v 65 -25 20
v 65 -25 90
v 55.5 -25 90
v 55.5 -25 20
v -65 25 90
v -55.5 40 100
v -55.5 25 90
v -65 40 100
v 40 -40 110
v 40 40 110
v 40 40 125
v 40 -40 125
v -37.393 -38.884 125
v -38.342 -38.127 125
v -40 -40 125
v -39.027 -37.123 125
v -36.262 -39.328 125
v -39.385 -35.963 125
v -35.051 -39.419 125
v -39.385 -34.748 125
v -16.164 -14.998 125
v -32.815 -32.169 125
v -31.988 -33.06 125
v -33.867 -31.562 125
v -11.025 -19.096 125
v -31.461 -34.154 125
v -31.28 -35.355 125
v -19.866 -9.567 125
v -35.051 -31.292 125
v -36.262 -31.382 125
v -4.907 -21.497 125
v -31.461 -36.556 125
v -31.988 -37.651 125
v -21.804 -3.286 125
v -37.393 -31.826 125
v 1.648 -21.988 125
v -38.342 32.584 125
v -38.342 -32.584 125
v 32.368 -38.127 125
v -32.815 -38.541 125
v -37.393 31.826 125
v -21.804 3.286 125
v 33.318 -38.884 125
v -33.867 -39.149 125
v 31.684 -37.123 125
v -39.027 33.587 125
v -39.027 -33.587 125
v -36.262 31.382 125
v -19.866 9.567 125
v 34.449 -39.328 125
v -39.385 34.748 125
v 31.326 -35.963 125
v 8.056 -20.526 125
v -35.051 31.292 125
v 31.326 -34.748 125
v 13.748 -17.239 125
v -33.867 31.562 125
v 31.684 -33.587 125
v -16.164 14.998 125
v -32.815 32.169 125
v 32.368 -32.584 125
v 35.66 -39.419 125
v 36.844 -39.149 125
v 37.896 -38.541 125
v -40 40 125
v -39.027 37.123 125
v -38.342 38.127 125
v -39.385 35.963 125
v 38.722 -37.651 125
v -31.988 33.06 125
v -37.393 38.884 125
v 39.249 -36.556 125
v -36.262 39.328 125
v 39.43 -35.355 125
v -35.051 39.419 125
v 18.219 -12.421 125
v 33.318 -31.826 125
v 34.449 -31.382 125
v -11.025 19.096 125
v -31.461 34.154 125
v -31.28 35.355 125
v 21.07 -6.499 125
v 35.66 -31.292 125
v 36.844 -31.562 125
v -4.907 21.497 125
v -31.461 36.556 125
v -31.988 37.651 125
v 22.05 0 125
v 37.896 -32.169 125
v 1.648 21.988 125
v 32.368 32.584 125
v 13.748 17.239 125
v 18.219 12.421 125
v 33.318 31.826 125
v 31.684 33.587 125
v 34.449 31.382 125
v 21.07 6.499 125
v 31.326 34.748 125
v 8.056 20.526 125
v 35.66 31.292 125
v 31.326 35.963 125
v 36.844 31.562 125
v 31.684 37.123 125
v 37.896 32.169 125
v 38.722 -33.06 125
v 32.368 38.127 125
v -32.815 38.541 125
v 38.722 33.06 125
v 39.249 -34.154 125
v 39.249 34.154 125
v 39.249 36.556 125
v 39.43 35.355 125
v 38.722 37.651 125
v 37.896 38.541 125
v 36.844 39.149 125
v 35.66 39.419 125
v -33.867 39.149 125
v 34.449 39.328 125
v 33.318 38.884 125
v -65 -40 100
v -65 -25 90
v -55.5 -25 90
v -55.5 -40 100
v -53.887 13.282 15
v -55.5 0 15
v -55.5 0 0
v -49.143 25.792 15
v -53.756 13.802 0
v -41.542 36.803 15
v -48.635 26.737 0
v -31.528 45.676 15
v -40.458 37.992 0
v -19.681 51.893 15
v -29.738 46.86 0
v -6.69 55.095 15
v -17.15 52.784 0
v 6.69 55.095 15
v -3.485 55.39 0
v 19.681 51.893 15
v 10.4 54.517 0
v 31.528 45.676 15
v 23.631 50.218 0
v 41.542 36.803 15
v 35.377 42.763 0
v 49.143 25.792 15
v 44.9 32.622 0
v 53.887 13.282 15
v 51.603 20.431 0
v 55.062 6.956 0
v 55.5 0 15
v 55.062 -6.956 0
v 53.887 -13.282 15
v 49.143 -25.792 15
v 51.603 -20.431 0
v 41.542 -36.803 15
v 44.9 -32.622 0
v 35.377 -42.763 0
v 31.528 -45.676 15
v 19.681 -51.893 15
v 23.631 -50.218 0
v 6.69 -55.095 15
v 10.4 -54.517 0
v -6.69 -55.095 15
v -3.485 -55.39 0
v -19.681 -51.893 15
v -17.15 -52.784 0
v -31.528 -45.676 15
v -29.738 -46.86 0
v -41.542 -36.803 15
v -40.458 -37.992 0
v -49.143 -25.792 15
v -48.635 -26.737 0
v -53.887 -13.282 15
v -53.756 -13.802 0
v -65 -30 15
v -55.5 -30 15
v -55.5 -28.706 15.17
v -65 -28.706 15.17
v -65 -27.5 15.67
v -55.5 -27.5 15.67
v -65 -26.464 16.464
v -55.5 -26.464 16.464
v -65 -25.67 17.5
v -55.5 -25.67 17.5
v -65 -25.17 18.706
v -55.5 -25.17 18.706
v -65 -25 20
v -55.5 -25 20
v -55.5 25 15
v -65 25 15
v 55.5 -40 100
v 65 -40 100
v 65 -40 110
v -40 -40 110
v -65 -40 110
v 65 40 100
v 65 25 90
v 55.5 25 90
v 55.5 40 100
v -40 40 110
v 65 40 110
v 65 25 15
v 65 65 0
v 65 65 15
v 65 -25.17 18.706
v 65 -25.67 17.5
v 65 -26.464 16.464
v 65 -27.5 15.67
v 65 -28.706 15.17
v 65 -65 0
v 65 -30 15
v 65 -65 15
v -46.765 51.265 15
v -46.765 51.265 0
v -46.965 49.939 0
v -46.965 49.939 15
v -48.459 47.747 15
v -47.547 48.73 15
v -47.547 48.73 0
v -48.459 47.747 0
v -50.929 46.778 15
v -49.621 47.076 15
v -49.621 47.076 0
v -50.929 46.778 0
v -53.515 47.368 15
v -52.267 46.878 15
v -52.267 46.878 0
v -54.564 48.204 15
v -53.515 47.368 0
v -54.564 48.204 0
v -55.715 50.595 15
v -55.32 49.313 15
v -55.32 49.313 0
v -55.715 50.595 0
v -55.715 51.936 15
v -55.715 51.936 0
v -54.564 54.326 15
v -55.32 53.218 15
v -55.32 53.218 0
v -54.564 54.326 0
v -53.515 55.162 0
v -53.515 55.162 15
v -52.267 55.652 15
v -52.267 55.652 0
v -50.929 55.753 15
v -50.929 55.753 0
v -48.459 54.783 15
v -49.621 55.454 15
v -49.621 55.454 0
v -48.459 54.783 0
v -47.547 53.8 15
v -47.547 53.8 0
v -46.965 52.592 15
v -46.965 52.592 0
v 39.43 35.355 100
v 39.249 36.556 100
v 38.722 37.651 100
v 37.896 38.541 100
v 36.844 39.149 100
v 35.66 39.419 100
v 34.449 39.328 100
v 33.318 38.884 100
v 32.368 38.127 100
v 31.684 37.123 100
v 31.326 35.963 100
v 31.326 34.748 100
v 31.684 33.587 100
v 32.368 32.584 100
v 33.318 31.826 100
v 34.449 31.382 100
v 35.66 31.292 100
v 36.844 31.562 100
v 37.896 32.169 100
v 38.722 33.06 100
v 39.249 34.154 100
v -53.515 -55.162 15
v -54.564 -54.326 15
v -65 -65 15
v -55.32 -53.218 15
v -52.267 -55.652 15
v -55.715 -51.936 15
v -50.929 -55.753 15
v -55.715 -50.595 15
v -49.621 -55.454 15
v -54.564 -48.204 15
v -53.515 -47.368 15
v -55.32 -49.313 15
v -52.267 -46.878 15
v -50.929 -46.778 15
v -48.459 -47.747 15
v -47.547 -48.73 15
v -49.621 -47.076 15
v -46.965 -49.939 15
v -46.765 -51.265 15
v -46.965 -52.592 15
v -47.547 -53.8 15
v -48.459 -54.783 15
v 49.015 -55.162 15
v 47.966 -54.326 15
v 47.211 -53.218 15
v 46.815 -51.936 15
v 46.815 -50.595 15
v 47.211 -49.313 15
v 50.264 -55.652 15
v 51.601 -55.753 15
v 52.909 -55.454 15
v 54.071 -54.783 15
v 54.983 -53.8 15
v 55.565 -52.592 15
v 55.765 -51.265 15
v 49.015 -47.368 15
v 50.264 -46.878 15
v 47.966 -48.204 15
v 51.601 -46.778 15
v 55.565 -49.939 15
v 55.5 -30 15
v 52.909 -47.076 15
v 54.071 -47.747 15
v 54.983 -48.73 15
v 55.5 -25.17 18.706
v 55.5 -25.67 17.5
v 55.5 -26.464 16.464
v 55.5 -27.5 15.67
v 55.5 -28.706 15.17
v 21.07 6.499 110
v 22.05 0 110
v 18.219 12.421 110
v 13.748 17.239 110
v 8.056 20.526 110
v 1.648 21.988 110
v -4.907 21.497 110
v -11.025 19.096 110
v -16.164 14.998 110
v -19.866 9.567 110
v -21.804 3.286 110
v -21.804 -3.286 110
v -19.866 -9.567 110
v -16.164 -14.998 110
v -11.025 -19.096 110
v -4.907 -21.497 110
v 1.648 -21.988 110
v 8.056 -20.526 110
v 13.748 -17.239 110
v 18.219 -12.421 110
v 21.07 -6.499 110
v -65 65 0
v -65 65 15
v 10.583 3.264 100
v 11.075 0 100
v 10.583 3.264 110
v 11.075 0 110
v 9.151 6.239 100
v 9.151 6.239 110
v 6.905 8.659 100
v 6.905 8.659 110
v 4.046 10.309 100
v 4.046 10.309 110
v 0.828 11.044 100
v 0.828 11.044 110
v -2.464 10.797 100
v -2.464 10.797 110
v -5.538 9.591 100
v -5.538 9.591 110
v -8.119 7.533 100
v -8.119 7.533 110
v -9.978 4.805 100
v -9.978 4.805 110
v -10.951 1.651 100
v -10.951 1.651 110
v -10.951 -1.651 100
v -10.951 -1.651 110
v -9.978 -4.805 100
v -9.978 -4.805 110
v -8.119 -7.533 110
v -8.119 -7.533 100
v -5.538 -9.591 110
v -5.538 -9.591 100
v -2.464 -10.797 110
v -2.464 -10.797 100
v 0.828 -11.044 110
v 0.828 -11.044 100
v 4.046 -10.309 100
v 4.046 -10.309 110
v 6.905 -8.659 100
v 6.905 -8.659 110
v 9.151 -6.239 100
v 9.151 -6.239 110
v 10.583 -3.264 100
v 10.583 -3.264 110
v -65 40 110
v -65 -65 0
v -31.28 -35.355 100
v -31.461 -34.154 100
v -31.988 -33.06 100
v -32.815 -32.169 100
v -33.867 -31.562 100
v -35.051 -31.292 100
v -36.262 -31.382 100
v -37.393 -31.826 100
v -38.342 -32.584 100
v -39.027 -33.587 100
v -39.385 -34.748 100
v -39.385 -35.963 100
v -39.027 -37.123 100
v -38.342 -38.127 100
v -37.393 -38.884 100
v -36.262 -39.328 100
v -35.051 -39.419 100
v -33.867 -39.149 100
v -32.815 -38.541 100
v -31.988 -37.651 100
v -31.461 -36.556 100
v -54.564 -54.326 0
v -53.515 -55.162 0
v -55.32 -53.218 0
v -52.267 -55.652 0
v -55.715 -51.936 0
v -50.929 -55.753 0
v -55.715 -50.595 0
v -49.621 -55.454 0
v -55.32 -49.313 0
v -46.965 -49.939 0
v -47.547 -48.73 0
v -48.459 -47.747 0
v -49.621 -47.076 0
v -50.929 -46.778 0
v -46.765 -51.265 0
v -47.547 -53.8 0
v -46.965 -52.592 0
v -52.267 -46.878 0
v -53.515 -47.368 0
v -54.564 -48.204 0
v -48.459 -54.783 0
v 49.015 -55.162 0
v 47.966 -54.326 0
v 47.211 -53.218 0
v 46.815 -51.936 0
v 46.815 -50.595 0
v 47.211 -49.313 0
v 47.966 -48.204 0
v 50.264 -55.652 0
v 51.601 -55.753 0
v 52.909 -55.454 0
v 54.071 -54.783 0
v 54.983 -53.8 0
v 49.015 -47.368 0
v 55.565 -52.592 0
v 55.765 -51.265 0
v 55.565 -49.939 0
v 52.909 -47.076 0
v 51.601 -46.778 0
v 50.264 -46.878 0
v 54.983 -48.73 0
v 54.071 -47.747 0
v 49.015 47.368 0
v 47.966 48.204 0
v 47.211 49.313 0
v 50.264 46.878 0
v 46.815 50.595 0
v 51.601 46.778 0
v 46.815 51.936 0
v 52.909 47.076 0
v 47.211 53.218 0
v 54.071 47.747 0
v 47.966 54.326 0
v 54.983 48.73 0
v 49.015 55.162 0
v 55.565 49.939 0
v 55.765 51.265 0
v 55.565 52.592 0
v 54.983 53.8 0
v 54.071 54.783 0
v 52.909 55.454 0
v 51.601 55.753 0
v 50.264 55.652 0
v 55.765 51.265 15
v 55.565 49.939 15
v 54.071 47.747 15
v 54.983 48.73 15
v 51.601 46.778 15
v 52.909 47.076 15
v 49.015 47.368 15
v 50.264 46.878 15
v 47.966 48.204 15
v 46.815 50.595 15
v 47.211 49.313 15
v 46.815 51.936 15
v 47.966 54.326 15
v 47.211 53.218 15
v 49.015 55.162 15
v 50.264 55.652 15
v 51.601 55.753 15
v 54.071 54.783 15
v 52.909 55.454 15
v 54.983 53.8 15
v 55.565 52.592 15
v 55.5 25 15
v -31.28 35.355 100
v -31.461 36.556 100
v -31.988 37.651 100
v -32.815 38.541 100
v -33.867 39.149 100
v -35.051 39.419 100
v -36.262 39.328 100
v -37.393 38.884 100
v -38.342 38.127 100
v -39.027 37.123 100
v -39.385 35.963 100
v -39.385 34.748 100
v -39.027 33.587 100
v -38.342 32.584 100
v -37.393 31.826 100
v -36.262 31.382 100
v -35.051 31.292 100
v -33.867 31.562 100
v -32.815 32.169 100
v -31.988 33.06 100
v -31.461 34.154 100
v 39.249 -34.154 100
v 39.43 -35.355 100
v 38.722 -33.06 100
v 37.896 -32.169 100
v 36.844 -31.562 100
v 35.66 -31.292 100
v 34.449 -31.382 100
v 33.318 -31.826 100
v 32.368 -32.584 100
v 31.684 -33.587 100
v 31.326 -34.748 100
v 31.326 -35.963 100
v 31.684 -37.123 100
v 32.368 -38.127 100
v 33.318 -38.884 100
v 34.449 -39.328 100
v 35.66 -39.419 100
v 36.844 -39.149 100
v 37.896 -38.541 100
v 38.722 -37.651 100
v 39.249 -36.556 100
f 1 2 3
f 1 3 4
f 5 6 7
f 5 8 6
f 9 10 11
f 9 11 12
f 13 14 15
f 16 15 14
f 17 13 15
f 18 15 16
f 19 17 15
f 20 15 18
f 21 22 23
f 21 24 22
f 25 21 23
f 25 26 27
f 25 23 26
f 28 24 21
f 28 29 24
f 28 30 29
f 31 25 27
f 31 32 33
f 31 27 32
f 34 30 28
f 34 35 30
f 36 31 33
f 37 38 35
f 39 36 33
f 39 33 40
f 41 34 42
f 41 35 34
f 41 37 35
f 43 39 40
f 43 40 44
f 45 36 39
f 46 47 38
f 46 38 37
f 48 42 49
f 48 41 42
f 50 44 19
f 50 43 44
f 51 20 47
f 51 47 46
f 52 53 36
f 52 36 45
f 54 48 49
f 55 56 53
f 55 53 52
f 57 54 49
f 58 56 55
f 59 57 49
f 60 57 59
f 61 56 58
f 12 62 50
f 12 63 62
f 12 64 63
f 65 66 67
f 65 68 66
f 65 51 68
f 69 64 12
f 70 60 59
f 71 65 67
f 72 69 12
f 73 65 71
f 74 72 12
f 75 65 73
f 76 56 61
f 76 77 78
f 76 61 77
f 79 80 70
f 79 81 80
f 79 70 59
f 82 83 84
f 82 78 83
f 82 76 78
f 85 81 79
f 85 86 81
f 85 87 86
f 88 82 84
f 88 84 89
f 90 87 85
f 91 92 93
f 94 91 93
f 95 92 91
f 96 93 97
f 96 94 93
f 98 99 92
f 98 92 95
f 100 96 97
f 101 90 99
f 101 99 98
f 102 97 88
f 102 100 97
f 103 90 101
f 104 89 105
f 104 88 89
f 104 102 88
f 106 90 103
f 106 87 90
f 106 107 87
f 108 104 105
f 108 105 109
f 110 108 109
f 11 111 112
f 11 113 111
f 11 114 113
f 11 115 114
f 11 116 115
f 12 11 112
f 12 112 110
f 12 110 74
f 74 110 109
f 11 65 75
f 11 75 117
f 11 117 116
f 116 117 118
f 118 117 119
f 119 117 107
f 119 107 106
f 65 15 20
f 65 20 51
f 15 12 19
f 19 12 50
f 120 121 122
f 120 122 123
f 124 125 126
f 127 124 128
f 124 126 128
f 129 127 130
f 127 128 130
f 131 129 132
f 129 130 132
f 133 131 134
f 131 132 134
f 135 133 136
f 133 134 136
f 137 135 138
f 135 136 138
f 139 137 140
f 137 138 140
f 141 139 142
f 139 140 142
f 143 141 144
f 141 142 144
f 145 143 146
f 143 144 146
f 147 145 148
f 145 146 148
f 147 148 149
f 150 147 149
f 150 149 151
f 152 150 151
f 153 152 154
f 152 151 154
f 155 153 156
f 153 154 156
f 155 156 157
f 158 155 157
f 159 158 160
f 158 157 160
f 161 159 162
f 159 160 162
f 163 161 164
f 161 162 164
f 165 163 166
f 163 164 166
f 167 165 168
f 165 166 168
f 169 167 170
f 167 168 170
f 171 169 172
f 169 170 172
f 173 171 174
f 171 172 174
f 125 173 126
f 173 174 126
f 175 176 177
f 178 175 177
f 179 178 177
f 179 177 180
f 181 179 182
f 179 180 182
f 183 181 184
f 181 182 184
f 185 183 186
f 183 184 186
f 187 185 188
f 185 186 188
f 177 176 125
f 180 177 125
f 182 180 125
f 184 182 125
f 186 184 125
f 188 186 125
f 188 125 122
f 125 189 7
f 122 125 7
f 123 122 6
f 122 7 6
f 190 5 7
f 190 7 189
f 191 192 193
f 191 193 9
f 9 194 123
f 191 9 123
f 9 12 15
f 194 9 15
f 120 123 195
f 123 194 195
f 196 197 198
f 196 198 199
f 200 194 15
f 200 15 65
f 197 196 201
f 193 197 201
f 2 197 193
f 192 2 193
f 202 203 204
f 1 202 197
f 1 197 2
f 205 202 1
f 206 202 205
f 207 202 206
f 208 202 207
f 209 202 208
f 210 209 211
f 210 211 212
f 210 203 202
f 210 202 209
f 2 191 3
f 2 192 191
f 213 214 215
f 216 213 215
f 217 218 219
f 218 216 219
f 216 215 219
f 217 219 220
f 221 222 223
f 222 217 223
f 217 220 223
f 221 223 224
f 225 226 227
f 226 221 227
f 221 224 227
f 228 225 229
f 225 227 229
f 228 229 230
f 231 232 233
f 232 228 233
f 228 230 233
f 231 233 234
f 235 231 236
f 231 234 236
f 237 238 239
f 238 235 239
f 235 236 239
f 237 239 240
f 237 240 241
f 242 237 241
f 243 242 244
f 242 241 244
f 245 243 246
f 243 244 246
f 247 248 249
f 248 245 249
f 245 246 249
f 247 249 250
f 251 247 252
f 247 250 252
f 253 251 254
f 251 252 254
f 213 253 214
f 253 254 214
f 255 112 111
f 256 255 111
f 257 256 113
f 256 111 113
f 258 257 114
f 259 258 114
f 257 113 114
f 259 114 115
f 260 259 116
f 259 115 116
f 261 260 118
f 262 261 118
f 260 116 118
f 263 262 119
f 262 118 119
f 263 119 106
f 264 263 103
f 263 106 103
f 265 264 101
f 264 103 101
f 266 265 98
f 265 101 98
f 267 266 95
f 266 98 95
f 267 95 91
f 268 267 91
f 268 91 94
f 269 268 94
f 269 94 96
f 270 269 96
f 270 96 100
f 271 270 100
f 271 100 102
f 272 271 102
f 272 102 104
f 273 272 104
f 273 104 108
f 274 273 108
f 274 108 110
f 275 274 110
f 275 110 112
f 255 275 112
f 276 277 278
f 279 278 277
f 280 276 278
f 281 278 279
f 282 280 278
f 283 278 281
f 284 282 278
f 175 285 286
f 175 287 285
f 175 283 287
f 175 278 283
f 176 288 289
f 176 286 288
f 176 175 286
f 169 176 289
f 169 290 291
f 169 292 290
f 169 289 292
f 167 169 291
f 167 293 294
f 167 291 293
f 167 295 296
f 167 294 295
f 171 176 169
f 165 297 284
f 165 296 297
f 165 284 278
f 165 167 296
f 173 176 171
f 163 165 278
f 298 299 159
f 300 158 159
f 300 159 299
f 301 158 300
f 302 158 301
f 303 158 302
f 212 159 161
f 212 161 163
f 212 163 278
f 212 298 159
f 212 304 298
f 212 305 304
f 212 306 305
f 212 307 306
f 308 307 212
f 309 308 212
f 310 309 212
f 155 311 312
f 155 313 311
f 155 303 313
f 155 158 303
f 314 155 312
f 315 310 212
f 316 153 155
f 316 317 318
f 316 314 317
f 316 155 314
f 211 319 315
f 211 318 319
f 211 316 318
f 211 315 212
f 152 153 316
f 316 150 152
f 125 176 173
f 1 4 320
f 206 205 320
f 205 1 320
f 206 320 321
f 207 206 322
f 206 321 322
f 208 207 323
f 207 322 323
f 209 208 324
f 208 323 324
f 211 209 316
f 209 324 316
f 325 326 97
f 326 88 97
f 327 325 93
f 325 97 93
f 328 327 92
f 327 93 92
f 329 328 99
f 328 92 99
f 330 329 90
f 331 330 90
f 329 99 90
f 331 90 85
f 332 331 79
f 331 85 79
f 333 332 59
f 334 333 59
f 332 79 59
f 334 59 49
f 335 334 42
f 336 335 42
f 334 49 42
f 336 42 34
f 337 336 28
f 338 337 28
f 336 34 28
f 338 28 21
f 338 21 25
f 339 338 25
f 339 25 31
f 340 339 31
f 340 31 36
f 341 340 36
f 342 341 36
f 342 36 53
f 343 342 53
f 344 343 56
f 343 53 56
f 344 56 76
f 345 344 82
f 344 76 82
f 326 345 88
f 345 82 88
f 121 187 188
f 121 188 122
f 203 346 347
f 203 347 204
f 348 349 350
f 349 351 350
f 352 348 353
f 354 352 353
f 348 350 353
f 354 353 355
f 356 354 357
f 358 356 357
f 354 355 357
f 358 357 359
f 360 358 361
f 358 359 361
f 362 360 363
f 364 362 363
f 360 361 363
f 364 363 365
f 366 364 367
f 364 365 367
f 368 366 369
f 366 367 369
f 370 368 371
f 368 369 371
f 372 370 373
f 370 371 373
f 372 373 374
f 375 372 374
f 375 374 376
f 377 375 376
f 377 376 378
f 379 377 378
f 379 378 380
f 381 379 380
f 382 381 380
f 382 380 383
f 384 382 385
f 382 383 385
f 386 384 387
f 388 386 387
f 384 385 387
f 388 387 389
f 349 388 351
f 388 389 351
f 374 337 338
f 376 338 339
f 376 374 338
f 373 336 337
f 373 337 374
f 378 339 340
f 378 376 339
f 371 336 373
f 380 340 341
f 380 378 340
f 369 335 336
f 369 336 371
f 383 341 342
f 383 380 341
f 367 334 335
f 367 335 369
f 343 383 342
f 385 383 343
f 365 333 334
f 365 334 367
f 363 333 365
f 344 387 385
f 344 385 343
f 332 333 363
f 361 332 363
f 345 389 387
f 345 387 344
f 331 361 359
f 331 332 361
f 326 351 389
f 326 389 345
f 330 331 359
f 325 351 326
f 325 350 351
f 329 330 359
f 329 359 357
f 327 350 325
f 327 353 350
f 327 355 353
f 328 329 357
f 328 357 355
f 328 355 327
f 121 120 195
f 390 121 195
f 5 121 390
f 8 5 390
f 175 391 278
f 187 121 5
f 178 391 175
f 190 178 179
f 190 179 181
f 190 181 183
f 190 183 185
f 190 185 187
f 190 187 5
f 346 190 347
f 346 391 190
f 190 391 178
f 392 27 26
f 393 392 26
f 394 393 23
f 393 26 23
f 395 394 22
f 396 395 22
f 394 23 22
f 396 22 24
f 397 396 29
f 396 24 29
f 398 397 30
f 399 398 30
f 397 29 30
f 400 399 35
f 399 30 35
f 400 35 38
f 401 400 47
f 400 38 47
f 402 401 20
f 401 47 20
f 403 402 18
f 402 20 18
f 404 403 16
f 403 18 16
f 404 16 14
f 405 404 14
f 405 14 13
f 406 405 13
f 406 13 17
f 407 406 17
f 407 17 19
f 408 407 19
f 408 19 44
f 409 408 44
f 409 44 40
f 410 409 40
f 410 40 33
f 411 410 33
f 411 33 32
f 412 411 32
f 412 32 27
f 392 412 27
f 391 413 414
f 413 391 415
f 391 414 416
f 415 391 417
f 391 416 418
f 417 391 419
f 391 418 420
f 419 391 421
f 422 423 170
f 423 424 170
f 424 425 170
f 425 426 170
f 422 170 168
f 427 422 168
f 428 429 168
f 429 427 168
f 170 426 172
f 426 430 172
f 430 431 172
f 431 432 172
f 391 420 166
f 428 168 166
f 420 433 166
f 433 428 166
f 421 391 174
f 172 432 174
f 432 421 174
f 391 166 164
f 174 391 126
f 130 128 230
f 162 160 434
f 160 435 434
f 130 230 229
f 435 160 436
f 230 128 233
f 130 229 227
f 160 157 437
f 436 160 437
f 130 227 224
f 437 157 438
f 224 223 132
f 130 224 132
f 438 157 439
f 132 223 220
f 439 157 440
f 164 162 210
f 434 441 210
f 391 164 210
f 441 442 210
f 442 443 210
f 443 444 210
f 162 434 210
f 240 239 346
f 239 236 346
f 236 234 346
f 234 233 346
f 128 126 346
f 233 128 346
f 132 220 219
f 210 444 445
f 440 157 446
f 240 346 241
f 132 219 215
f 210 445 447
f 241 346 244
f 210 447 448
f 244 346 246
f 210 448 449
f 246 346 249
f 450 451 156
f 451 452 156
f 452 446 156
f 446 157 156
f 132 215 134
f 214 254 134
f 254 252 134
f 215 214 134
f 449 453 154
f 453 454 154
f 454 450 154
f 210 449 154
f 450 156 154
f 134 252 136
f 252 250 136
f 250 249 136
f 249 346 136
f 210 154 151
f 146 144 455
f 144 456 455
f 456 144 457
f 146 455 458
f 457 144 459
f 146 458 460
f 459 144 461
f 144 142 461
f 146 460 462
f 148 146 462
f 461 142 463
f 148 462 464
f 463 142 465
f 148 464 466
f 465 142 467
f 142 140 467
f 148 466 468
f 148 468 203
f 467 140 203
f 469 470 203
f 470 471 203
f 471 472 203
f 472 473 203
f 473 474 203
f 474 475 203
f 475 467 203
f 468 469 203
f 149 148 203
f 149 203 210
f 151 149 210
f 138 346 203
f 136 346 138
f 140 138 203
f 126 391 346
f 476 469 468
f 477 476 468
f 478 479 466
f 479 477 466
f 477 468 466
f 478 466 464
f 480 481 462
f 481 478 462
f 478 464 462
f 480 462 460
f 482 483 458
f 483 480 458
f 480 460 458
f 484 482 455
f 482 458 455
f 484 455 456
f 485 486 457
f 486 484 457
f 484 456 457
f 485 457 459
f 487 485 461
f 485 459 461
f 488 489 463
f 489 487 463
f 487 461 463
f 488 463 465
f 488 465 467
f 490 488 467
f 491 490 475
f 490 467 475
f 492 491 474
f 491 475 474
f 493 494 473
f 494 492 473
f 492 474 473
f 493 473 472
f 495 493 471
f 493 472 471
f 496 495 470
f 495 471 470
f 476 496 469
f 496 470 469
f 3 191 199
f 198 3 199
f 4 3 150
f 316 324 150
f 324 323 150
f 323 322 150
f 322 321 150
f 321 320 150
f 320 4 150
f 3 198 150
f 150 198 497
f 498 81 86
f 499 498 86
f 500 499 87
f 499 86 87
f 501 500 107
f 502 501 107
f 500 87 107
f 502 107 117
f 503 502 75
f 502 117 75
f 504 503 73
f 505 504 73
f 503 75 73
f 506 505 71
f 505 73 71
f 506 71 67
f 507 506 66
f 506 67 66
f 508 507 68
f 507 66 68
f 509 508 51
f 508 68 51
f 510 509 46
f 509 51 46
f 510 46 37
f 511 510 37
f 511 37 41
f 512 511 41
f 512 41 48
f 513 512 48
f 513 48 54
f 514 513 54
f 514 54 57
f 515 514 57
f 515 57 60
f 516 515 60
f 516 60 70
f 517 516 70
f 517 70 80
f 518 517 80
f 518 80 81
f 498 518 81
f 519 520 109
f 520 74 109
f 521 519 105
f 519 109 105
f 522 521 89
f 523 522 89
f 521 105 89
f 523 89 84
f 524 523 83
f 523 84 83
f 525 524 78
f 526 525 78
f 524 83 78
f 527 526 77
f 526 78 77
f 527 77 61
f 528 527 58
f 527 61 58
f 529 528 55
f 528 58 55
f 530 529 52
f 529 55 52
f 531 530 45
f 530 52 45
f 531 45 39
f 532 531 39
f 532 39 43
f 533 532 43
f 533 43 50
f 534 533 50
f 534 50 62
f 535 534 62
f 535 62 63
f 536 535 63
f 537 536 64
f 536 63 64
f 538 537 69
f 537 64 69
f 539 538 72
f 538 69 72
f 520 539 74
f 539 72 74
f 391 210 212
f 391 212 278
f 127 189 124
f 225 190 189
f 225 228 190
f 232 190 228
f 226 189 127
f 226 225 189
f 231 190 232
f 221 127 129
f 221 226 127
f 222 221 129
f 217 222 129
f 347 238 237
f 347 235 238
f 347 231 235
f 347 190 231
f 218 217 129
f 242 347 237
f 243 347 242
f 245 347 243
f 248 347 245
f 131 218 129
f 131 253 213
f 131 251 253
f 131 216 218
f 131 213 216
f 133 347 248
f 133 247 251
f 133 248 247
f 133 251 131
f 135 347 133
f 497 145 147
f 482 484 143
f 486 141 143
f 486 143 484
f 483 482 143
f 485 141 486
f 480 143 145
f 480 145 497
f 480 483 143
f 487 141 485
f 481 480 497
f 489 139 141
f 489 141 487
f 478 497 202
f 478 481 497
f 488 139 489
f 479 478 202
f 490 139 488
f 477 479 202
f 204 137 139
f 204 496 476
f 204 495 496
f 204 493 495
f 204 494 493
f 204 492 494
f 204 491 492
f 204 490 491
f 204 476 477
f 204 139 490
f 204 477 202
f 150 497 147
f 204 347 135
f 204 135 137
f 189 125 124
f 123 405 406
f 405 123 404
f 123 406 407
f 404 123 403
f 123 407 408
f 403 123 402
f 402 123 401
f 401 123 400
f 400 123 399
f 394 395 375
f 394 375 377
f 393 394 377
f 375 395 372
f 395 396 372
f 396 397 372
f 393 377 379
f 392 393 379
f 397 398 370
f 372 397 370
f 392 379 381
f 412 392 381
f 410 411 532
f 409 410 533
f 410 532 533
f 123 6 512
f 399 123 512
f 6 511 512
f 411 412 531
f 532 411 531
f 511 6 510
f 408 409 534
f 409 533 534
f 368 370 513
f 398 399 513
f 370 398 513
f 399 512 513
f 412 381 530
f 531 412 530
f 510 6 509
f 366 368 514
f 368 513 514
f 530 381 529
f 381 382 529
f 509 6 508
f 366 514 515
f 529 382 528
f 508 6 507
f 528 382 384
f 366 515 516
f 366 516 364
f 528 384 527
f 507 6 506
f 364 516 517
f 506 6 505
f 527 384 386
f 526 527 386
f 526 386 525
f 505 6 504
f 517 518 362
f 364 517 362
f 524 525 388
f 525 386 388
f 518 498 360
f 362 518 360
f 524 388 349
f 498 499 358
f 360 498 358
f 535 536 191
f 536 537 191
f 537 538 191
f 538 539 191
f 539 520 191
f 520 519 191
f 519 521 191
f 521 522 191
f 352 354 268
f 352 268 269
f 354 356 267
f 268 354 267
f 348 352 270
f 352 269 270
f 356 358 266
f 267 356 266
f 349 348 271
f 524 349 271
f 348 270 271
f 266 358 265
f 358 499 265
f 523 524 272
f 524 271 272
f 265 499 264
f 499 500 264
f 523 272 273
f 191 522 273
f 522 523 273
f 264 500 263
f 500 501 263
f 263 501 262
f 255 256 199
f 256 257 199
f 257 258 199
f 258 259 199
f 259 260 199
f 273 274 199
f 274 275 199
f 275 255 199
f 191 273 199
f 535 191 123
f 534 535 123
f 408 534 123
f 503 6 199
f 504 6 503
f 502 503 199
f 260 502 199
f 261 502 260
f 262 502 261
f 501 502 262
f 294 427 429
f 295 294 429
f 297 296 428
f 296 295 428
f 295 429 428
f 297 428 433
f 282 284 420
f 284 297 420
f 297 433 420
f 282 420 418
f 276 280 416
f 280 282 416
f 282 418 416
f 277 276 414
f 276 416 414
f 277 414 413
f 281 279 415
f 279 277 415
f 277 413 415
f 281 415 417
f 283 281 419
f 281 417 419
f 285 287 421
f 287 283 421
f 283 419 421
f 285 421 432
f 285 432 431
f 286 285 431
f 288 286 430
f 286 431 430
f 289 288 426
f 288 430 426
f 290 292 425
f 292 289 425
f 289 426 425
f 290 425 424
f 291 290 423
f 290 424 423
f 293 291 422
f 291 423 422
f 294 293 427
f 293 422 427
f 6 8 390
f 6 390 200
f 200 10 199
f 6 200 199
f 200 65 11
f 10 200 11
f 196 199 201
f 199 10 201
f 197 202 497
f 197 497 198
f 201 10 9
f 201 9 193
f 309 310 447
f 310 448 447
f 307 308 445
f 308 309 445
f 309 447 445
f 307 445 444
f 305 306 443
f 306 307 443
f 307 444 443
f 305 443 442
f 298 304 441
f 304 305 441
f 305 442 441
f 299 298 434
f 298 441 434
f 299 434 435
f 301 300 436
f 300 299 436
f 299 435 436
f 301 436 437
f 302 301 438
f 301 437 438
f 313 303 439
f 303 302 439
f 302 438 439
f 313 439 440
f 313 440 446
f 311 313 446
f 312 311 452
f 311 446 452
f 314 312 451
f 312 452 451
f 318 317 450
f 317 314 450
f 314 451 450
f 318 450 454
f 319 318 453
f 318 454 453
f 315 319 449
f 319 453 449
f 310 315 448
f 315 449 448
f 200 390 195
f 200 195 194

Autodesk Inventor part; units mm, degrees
ref_plane "YZ Plane" through (0, 0, 0) normal (1, 0, 0) x (0, 1, 0)
ref_plane "XZ Plane" through (0, 0, 0) normal (0, 1, 0) x (-1, 0, 0)
ref_plane "XY Plane" through (0, 0, 0) normal (0, 0, 1) x (1, 0, 0)
sketch "Sketch1" plane through (0, 0, 0) normal (0, 0, 1) x (1, 0, 0)
  line L0 (-65, 65) -> (65, 65)
  line L1 (65, 65) -> (65, -65)
  line L2 (65, -65) -> (-65, -65)
  line L3 (-65, -65) -> (-65, 65)
  line L4 (-65, 65) -> (65, -65) construction
  line L5 (65, 65) -> (-65, -65) construction
  circle A0 centre (0, 0) radius 72.5 construction
  circle A1 centre (51.2652, 51.2652) radius 4.5
  line L6 (0, 0) -> (0, 13.8436) construction
  line L7 (0, 0) -> (-14.1522, 0) construction
  circle A2 centre (-51.2652, 51.2652) radius 4.5
  circle A3 centre (51.2652, -51.2652) radius 4.5
  circle A4 centre (-51.2652, -51.2652) radius 4.5
  dimension "d66" = 145
  dimension "d0" = 130
  dimension "d1" = 130
  dimension "d67" = 9
extrude "Extrusion1" add sketch "Sketch1" along normal blind 15
sketch "Sketch2" plane through (65, -65, 0) normal (1, 0, 0) x (0, 0, -1)
  line L0 (0, 0) -> (0, 130) construction
  line L1 (-22.5, 65) -> (-82.5, 65) construction
  line L2 (-90, 40) -> (-15, 40)
  line L3 (-15, 90) -> (-15, 40)
  line L4 (-15, 0) -> (-15, 130) construction
  line L5 (-15, 90) -> (-15, 130) construction
  line L6 (-100, 105) -> (-110, 105)
  line L7 (-110, 105) -> (-110, 25)
  line L8 (-15, 90) -> (-90, 90)
  line L9 (-90, 90) -> (-100, 105)
  line L10 (-110, 25) -> (-100, 25)
  line L11 (-100, 25) -> (-90, 40)
  point P0 (0, 90)
  point P1 (0, 40)
  dimension "d98" = 10
  dimension "d101" = 110
  dimension "d102" = 75
  dimension "d103" = 75
  dimension "d104" = 10
extrude "Extrusion2" add sketch "Sketch2" against normal blind 9.5
mirror "Mirror1" about plane through (0, 0, 0) normal (1, 0, 0) of "Extrusion2"
sketch "Sketch6" plane through (0, 0, 0) normal (0, 0, -1) x (-1, 0, 0)
  circle A0 centre (0, 0) radius 55.5
  dimension "d37" = 111
extrude "Extrusion6" cut sketch "Sketch6" against normal up to surface (15 mm away)
fillet "Fillet1" radius 5 2 edges at (-60.25, -25, 15) (60.25, -25, 15)
sketch "Sketch14" plane through (-65, -40, 110) normal (0, 0, 1) x (1, 0, 0)
  line L0 (120.5, 15) -> (120.5, 0) projected
  line L1 (9.5, 80) -> (120.5, 80)
  line L2 (120.5, 80) -> (120.5, 0)
  line L3 (120.5, 0) -> (9.5, 0)
  line L4 (9.5, 0) -> (9.5, 80)
extrude "Extrusion14" add sketch "Sketch14" against normal blind 10
sketch "Sketch15" plane through (65, -40, 110) normal (0, 0, 1) x (1, 0, 0)
  line L0 (-25, 0) -> (-105, 0)
  line L1 (-105, 0) -> (-105, 80)
  line L2 (-105, 80) -> (-25, 80)
  line L3 (-25, 80) -> (-25, 0)
  line L4 (-25, 0) -> (-105, 80) construction
  line L5 (-105, 0) -> (-25, 80) construction
  point P0 (-65, 40)
  dimension "d105" = 80
  dimension "d106" = 80
extrude "Extrusion15" add sketch "Sketch15" along normal blind 15
sketch "Sketch16" plane through (65, -40, 125) normal (0, 0, 1) x (1, 0, 0)
  circle A0 centre (-65, 40) radius 50 construction
  line L0 (-65, 40) -> (-100.3553, 75.3553) construction
  line L1 (-65, 40) -> (-15, 40) construction
  line L2 (-65, 40) -> (-65, 52) construction
  circle A1 centre (-100.3553, 75.3553) radius 4.075
  circle A2 centre (-29.6447, 75.3553) radius 4.075
  circle A3 centre (-100.3553, 4.6447) radius 4.075
  circle A4 centre (-29.6447, 4.6447) radius 4.075
  circle A5 centre (-65, 40) radius 11.075
  dimension "d109" = 100
  dimension "d110" = 135
  dimension "d111" = 12
  dimension "d112" = 8.15
  dimension "d113" = 22.15
extrude "Extrusion16" cut sketch "Sketch16" against normal up to surface (25 mm away)
sketch "Sketch17" plane through (65, -40, 125) normal (0, 0, 1) x (1, 0, 0)
  circle A0 centre (-65, 40) radius 22.05
  circle A1 centre (-65, 40) radius 11.075 projected
  dimension "d116" = 44.1
extrude "Extrusion17" cut sketch "Sketch17" against normal blind 15
properties part number "MOTOR-BRACKET"
